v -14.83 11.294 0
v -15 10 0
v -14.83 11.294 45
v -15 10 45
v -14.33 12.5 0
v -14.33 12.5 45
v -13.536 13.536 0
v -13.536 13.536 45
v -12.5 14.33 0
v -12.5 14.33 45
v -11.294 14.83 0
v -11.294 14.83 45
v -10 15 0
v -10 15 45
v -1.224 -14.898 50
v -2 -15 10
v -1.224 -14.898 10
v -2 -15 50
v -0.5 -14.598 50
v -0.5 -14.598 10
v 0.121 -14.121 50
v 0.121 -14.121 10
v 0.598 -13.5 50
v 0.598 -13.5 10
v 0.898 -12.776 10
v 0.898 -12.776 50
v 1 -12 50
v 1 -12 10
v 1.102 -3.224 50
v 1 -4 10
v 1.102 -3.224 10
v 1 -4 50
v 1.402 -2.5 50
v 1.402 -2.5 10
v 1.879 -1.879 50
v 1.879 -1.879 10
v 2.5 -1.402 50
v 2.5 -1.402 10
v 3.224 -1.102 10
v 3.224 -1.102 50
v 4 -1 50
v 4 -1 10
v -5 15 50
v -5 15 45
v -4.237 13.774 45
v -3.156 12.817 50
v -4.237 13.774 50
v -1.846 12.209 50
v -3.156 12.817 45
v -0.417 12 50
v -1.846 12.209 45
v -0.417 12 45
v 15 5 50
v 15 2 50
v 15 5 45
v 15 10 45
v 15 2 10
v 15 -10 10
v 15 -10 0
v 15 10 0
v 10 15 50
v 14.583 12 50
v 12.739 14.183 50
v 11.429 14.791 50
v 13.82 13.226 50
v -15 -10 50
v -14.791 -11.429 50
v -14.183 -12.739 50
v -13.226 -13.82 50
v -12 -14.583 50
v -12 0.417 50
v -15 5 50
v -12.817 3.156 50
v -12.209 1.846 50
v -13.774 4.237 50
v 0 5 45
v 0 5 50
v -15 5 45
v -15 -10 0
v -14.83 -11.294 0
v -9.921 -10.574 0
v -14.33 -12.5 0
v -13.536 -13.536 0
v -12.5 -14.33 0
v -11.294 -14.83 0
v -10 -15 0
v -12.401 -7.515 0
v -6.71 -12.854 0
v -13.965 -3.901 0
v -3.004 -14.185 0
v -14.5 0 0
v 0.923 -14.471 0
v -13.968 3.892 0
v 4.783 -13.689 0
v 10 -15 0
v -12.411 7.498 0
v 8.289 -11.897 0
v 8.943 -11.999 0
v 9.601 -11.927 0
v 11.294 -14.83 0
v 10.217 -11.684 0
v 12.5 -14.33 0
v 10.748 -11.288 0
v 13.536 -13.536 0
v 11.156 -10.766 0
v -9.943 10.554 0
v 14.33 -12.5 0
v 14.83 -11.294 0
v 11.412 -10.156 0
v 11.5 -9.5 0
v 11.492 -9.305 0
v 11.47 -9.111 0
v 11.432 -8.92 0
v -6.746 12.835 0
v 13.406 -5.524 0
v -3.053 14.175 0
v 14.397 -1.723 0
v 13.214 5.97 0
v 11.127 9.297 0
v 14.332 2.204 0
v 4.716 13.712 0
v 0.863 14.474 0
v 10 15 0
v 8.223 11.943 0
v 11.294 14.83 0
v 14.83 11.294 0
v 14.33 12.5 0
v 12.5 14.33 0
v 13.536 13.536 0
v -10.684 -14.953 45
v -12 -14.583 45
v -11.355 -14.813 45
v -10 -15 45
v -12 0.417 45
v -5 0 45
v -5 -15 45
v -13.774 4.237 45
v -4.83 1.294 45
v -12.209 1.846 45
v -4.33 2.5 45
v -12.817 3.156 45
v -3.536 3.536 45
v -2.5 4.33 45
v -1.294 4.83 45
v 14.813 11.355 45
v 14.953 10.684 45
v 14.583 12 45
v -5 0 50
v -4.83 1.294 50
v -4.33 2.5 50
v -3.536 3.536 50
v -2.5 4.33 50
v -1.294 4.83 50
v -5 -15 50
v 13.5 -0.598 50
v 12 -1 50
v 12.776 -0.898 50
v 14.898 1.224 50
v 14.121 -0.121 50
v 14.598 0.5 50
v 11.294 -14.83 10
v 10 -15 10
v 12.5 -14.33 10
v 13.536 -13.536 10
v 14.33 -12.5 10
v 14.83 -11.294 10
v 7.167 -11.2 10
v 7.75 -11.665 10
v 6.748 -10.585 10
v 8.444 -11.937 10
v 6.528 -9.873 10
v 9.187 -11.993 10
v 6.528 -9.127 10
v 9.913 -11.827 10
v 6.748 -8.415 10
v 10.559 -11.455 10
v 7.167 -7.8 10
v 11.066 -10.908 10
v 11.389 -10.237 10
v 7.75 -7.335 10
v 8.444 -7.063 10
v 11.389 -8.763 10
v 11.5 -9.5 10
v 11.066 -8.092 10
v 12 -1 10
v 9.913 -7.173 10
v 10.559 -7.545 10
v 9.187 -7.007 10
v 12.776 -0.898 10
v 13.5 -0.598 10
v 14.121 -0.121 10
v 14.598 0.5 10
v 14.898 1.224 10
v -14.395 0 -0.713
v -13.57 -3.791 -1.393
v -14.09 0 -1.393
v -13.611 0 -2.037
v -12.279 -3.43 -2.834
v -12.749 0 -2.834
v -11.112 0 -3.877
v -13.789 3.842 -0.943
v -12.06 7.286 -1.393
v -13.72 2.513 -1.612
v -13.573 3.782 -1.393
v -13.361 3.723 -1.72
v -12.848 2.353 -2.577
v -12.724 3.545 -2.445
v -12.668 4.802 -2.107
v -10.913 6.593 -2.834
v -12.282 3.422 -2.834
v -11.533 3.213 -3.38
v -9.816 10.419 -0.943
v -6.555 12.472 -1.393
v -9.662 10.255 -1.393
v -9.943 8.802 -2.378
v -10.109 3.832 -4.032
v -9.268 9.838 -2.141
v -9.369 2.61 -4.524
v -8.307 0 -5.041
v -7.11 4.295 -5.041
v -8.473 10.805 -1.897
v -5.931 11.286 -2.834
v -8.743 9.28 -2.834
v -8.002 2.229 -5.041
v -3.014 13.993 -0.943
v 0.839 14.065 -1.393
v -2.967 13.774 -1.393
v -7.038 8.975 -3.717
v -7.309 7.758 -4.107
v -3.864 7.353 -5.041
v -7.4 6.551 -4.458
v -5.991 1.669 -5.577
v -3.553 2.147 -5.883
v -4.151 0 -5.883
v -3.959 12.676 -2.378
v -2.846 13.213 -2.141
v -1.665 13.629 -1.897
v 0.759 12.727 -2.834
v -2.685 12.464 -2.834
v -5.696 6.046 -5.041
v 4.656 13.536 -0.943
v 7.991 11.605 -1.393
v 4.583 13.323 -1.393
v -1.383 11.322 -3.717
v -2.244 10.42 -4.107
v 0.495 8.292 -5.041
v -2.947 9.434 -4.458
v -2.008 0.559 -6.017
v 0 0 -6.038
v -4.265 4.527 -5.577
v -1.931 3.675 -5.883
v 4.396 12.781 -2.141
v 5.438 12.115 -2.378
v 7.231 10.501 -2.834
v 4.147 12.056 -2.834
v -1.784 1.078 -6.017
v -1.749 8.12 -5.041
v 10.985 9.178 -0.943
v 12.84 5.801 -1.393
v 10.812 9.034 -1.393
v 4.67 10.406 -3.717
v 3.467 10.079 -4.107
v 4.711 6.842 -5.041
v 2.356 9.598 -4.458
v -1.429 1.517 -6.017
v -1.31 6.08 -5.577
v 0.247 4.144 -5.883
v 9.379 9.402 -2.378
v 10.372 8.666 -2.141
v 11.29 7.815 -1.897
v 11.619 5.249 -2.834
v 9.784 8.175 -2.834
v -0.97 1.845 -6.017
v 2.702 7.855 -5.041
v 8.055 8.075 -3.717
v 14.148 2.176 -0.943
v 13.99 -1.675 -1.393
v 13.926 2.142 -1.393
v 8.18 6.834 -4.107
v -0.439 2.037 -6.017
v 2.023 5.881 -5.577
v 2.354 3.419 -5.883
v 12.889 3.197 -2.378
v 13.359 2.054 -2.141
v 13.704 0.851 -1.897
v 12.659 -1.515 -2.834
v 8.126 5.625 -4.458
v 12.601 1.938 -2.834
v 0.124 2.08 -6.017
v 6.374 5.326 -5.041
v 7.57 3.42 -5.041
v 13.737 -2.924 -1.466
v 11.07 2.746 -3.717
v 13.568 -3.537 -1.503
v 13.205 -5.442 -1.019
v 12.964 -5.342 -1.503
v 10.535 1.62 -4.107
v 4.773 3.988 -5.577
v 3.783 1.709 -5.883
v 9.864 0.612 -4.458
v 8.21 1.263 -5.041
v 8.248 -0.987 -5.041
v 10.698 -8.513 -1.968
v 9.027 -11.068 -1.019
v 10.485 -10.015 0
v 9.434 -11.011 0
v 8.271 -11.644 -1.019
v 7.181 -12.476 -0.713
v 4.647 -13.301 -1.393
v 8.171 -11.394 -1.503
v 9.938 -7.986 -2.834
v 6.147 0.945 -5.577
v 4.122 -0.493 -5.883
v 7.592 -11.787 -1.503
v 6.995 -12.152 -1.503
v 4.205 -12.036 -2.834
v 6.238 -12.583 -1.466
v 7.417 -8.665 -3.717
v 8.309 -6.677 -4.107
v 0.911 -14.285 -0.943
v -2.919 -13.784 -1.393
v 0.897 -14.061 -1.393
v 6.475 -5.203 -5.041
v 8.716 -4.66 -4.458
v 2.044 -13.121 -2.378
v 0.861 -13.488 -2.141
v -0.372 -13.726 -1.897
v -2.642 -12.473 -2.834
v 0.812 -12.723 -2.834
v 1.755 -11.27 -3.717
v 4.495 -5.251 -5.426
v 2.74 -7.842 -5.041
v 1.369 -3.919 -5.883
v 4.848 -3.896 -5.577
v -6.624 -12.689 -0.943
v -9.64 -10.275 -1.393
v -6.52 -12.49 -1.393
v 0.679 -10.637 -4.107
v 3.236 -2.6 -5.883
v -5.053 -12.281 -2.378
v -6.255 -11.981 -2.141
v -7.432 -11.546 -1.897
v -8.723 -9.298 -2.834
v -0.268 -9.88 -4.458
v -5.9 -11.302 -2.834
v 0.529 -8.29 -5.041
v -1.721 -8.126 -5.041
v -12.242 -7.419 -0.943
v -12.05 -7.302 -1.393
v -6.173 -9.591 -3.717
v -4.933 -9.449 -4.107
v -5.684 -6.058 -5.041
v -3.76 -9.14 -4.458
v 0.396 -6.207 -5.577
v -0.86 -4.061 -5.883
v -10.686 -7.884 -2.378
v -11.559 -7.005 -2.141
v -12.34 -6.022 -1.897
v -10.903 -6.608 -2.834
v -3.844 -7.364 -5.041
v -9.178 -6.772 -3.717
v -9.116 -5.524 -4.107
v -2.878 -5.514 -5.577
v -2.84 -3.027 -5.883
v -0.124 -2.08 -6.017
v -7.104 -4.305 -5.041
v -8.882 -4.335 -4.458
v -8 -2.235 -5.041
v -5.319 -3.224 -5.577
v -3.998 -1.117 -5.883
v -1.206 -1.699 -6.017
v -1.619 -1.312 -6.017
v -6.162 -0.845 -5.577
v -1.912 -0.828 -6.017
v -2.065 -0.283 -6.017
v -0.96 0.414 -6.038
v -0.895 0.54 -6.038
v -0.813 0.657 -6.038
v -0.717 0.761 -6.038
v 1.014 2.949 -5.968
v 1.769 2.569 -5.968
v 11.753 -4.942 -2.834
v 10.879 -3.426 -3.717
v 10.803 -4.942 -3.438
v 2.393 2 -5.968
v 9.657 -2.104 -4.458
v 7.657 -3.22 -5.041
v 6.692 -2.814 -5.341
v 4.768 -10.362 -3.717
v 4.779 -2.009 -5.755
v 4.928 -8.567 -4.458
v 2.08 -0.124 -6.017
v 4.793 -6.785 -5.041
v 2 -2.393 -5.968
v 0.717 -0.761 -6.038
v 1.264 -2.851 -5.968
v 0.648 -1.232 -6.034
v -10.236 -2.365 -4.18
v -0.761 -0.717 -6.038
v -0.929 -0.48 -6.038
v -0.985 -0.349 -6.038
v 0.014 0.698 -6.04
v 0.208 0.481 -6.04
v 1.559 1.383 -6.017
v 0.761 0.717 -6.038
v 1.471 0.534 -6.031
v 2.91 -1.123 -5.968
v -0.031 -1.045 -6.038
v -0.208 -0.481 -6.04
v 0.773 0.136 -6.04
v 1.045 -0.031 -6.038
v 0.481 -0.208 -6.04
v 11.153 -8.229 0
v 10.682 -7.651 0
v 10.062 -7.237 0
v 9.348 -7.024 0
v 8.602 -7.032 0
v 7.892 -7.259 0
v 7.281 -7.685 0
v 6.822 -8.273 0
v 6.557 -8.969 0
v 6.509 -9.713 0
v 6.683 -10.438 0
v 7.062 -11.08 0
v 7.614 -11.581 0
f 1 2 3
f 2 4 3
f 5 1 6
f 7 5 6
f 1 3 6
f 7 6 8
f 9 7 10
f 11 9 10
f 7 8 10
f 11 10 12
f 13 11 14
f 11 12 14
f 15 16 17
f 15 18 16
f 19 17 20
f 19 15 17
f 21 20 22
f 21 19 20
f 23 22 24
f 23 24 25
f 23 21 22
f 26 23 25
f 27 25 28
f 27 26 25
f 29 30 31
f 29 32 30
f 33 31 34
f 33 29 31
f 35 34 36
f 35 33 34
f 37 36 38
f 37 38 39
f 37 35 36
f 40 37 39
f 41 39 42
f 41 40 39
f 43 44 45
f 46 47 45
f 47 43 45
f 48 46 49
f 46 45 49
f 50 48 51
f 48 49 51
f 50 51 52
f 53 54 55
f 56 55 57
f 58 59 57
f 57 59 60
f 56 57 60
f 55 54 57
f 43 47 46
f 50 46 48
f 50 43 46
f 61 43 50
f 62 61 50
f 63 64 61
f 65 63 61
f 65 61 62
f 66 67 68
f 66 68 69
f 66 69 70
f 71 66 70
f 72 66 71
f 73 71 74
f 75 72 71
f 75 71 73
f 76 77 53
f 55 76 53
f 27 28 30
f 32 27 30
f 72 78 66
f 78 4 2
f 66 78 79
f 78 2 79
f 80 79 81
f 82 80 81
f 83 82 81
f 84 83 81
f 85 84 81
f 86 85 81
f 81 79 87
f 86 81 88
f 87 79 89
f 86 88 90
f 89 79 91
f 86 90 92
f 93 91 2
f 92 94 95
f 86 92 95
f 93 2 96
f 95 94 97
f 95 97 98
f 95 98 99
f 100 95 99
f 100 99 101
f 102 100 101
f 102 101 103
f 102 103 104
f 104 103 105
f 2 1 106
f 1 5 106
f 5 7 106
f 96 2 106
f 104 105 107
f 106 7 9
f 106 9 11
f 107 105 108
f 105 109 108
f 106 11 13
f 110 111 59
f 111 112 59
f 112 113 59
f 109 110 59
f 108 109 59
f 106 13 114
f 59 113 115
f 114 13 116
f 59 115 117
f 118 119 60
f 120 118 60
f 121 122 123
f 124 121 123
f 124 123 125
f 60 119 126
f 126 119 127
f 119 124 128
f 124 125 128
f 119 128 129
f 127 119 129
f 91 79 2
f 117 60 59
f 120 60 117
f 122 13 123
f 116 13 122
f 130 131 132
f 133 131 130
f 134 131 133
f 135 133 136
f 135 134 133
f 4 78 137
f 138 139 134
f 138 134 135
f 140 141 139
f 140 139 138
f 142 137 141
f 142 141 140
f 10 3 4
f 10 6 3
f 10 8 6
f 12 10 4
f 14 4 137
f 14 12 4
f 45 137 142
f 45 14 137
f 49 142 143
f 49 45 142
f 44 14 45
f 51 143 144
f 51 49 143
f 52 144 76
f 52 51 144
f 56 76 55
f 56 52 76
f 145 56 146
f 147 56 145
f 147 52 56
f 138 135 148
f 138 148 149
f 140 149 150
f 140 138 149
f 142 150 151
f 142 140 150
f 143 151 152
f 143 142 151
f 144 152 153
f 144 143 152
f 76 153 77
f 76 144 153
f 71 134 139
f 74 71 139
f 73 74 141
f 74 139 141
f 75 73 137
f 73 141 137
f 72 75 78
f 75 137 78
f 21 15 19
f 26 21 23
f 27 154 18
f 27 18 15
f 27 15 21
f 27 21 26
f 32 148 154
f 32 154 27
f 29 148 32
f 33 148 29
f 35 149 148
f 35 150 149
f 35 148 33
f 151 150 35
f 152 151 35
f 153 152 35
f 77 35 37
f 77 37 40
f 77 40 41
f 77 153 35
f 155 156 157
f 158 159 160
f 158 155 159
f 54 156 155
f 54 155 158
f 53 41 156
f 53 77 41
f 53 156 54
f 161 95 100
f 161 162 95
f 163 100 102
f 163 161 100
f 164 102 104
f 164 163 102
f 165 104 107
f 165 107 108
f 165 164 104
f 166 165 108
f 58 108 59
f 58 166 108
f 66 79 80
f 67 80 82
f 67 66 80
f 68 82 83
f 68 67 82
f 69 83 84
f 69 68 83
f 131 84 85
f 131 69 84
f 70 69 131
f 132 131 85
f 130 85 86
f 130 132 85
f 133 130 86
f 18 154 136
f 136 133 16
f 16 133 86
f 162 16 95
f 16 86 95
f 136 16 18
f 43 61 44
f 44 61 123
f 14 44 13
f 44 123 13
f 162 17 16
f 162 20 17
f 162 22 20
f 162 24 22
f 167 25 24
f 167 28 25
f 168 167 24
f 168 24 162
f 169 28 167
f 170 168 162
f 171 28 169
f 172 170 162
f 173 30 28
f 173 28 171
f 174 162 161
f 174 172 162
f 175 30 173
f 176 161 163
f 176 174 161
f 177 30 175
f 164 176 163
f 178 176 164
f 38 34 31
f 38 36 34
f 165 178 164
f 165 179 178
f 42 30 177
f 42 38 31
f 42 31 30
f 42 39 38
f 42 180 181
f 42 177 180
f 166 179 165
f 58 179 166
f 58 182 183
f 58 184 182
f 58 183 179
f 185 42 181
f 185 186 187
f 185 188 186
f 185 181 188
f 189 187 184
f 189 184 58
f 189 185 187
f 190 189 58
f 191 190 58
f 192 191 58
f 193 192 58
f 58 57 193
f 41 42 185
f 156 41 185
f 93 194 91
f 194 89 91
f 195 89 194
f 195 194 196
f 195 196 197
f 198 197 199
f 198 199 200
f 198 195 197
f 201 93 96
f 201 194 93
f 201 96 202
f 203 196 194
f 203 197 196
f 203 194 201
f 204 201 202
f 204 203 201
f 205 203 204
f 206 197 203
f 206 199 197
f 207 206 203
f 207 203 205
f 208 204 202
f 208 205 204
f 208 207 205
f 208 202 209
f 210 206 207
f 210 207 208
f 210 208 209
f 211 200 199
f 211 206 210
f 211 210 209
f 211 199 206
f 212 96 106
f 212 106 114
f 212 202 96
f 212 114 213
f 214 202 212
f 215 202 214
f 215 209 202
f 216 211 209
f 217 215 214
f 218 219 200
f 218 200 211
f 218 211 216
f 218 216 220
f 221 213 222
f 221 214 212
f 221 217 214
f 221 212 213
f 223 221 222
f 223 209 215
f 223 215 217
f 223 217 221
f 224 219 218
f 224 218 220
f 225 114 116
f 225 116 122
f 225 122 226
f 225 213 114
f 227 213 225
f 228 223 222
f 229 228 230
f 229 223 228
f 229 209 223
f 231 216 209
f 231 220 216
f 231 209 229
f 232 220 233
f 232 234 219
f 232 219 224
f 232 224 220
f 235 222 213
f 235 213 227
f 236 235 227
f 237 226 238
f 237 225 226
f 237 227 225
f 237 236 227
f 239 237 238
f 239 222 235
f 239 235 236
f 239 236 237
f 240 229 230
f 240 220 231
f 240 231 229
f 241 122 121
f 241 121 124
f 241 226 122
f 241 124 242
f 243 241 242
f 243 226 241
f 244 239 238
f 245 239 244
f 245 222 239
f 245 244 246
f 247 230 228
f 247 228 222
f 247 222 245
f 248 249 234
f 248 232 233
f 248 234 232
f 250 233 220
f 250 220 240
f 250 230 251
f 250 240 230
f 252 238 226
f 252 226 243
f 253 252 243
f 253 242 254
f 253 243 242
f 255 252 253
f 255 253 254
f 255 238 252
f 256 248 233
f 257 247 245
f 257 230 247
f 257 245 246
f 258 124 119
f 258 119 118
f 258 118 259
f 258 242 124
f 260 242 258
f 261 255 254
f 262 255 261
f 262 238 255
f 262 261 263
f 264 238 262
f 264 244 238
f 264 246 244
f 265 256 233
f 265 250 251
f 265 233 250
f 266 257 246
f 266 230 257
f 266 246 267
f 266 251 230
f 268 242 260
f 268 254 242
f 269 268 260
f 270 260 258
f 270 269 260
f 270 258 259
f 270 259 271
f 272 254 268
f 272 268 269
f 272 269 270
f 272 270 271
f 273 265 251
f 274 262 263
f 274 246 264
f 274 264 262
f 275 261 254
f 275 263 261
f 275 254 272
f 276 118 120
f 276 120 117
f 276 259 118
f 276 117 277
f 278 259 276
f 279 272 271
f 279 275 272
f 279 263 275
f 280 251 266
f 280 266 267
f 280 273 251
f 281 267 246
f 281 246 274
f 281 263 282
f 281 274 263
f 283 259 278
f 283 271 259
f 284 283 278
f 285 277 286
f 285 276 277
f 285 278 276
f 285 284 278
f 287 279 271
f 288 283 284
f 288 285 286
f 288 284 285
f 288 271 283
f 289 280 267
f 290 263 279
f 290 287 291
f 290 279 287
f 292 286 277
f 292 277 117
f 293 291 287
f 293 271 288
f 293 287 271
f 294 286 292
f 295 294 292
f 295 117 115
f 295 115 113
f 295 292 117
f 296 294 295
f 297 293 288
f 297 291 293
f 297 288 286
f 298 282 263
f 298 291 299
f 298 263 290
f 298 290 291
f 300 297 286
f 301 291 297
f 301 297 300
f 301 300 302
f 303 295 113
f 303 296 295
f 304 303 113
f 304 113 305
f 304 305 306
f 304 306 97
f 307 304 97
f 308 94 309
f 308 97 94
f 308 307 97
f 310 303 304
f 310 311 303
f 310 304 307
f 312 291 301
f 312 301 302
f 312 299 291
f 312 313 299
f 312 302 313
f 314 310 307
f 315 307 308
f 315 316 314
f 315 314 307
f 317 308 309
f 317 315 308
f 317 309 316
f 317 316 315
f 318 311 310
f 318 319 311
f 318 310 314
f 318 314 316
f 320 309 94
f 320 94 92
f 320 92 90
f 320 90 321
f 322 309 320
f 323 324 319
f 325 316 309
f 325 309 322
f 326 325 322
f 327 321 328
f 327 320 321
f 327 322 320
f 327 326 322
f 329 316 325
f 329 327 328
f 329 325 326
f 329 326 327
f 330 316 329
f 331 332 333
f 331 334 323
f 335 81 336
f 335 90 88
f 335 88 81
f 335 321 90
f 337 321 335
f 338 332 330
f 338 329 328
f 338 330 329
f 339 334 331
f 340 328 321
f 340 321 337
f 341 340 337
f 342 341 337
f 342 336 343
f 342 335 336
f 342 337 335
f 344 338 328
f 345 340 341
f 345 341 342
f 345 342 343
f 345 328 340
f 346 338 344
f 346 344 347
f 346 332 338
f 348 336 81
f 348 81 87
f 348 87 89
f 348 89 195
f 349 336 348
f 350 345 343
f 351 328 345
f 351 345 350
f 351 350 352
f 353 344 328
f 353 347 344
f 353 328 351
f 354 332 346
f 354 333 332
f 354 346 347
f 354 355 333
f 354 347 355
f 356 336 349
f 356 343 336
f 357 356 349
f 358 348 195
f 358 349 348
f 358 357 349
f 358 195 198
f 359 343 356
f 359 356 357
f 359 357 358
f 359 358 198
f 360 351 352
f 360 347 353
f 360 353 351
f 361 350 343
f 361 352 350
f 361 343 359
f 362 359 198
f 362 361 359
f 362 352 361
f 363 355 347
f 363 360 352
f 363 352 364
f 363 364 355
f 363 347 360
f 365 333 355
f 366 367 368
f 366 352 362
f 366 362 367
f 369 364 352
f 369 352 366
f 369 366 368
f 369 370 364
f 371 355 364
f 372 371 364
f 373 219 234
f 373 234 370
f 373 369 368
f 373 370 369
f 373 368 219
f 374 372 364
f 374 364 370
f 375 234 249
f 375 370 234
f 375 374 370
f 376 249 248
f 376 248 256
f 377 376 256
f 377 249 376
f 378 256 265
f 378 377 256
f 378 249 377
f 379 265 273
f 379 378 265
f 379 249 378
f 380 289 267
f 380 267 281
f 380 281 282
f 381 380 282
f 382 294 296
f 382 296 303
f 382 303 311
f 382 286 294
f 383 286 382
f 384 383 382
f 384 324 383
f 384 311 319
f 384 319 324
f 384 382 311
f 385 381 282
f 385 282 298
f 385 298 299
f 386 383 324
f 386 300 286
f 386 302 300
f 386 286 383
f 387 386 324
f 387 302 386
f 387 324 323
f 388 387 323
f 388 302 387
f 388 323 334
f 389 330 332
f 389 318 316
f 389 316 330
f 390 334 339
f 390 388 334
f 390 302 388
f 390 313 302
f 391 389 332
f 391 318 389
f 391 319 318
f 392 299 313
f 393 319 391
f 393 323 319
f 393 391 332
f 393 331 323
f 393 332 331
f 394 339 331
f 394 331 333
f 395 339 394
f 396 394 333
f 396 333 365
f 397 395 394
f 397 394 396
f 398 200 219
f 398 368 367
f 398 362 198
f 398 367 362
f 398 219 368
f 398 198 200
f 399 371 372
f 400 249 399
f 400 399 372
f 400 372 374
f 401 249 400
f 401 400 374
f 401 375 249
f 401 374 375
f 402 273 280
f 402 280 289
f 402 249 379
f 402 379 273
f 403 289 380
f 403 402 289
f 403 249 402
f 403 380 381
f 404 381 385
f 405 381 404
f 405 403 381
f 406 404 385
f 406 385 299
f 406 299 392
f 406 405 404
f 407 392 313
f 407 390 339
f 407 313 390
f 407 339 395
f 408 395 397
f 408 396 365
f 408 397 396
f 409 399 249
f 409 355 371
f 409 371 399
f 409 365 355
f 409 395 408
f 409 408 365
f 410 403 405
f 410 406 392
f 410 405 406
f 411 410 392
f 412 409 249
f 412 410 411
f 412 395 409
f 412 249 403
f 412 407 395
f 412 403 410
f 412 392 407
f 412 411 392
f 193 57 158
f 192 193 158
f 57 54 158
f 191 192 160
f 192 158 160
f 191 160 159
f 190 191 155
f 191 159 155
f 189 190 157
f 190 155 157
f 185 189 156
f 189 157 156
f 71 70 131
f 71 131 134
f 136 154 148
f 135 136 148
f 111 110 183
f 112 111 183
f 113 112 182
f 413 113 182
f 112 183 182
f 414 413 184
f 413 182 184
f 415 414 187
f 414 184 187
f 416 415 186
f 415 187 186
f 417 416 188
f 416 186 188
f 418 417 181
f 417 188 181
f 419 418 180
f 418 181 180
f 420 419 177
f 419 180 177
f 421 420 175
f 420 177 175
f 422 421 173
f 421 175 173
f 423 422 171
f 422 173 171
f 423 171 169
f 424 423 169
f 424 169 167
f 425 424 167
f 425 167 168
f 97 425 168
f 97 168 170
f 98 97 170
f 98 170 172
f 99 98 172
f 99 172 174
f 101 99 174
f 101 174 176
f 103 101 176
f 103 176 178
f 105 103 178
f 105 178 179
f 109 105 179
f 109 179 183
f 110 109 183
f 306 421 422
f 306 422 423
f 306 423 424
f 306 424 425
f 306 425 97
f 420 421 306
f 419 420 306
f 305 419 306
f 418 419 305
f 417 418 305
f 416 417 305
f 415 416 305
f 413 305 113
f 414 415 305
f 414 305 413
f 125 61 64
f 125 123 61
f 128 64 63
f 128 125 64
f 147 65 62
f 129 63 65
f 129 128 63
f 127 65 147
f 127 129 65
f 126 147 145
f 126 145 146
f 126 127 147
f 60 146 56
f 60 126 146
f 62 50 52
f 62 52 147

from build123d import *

# Parameters (mm, degrees)
F0_W         = 30
F0_H         = 30
F1_DEPTH     = 10
F3_DEPTH     = 40
F4_W         = 7
F4_H         = 3
F4_W_2       = 3
F4_H_2       = 7
F4_H_3       = 20
F4_W_3       = 20
F5_DEPTH     = 5
F6_R         = 2.5
F7_DEPTH     = 10
F10_R        = 5
F11_T1_DEPTH = 17.5
F11_T3_DEPTH = 16.4564392374
F12_R        = 3


# Not quite as in the source:
# - a fillet or chamfer that OpenCascade refuses, or shapes differently, is made with other operations: its cross-section is extruded or revolved along the edge and cut away or added


with BuildPart() as f1:
    # F0 (on Top) → F1 (new body)
    with BuildSketch(Plane.XY):
        Rectangle(F0_W, F0_H)
    extrude(amount=F1_DEPTH)

    # F2 (on face) → F3 (join)
    with BuildSketch(Plane.XY.offset(10)):
        Polygon((15, 15), (-15, 15), (-15, -15), (1, -15), (1, -1), (15, -1), align=None)
    extrude(amount=F3_DEPTH)

    # F4 (on face) → F5 (cut)
    with BuildSketch(Plane.XY.offset(50)):
        with Locations((-8.5, 13.5)):
            Rectangle(F4_W, F4_H)
        with Locations((-13.5, 13.5)):
            Rectangle(F4_W_2, F4_H)
        with Locations((-8.5, 8.5)):
            Rectangle(F4_W, F4_H_2)
        with Locations((-13.5, 8.5)):
            Rectangle(F4_W_2, F4_H_2)
        with Locations((-8.5, -5)):
            Rectangle(F4_W, F4_H_3)
        with Locations((5, 8.5)):
            Rectangle(F4_W_3, F4_H_2)
    extrude(amount=-F5_DEPTH, mode=Mode.SUBTRACT)

    # F6 (on face) → F7 (cut, through all)
    with BuildSketch(Plane.XY.offset(10)):
        with Locations((9, -9.5)):
            Circle(F6_R)
    extrude(amount=-F7_DEPTH, mode=Mode.SUBTRACT)

    # F8 (on Front) → F9 (revolve)
    with BuildSketch(Plane.XZ):
        with BuildLine():
            Line((0, 0), (-14.5, 0))
            add(Edge.make_bspline(
                [(-14.5, 0), (-14.5131281167, -2.1023036255), (-8.5269566385, -5.7796890584), (-3.0055961106, -6.062279921), (0, -6.0380934738)],
                knots=[0, 0, 0, 0, 0.4748413397, 1, 1, 1, 1], degree=3))
            Line((0, -6.0380934738), (0, 0))
        make_face()
    revolve(axis=Axis((0, 0, -7.25), (0, 0, -1)))

    # F10
    f10_edges = [f1.edges().sort_by_distance(p)[0] for p in [
        (-15, -15, 25),
        (15, -15, 5),
        (-15, 15, 22.5),
        (15, 15, 25),
    ]]
    fillet(f10_edges, radius=F10_R)

    # F11: fillet of radius 5 on 3 edges, made by hand

    # F11_s2 → F11_t1 (cut)
    with BuildSketch(Plane.XY.offset(45)):
        with BuildLine():
            ThreePointArc((-5, 0), (-3.5355339059, 3.5355339059), (0, 5))
            Line((0, 5), (-5, 5))
            Line((-5, 5), (-5, 0))
        make_face()
    extrude(amount=F11_T1_DEPTH, mode=Mode.SUBTRACT)

    # F11_s4 → F11_t3 (cut)
    with BuildSketch(Plane.XY.offset(45)):
        with BuildLine():
            ThreePointArc((-5, 15), (-3.1560370926, 12.8166998673), (-0.417424305, 12))
            Line((-0.417424305, 12), (-5, 12))
            Line((-5, 12), (-5, 15))
        make_face()
        with BuildLine():
            ThreePointArc((-12, 0.417424305), (-12.8166998673, 3.1560370926), (-15, 5))
            Line((-15, 5), (-12, 5))
            Line((-12, 5), (-12, 0.417424305))
        make_face()
    extrude(amount=F11_T3_DEPTH, mode=Mode.SUBTRACT)

    # F12
    f12_edges = [f1.edges().sort_by_distance(p)[0] for p in [
        (1, -1, 30),
        (1, -15, 30),
        (15, -1, 30),
    ]]
    fillet(f12_edges, radius=F12_R)


solid = f1.part
